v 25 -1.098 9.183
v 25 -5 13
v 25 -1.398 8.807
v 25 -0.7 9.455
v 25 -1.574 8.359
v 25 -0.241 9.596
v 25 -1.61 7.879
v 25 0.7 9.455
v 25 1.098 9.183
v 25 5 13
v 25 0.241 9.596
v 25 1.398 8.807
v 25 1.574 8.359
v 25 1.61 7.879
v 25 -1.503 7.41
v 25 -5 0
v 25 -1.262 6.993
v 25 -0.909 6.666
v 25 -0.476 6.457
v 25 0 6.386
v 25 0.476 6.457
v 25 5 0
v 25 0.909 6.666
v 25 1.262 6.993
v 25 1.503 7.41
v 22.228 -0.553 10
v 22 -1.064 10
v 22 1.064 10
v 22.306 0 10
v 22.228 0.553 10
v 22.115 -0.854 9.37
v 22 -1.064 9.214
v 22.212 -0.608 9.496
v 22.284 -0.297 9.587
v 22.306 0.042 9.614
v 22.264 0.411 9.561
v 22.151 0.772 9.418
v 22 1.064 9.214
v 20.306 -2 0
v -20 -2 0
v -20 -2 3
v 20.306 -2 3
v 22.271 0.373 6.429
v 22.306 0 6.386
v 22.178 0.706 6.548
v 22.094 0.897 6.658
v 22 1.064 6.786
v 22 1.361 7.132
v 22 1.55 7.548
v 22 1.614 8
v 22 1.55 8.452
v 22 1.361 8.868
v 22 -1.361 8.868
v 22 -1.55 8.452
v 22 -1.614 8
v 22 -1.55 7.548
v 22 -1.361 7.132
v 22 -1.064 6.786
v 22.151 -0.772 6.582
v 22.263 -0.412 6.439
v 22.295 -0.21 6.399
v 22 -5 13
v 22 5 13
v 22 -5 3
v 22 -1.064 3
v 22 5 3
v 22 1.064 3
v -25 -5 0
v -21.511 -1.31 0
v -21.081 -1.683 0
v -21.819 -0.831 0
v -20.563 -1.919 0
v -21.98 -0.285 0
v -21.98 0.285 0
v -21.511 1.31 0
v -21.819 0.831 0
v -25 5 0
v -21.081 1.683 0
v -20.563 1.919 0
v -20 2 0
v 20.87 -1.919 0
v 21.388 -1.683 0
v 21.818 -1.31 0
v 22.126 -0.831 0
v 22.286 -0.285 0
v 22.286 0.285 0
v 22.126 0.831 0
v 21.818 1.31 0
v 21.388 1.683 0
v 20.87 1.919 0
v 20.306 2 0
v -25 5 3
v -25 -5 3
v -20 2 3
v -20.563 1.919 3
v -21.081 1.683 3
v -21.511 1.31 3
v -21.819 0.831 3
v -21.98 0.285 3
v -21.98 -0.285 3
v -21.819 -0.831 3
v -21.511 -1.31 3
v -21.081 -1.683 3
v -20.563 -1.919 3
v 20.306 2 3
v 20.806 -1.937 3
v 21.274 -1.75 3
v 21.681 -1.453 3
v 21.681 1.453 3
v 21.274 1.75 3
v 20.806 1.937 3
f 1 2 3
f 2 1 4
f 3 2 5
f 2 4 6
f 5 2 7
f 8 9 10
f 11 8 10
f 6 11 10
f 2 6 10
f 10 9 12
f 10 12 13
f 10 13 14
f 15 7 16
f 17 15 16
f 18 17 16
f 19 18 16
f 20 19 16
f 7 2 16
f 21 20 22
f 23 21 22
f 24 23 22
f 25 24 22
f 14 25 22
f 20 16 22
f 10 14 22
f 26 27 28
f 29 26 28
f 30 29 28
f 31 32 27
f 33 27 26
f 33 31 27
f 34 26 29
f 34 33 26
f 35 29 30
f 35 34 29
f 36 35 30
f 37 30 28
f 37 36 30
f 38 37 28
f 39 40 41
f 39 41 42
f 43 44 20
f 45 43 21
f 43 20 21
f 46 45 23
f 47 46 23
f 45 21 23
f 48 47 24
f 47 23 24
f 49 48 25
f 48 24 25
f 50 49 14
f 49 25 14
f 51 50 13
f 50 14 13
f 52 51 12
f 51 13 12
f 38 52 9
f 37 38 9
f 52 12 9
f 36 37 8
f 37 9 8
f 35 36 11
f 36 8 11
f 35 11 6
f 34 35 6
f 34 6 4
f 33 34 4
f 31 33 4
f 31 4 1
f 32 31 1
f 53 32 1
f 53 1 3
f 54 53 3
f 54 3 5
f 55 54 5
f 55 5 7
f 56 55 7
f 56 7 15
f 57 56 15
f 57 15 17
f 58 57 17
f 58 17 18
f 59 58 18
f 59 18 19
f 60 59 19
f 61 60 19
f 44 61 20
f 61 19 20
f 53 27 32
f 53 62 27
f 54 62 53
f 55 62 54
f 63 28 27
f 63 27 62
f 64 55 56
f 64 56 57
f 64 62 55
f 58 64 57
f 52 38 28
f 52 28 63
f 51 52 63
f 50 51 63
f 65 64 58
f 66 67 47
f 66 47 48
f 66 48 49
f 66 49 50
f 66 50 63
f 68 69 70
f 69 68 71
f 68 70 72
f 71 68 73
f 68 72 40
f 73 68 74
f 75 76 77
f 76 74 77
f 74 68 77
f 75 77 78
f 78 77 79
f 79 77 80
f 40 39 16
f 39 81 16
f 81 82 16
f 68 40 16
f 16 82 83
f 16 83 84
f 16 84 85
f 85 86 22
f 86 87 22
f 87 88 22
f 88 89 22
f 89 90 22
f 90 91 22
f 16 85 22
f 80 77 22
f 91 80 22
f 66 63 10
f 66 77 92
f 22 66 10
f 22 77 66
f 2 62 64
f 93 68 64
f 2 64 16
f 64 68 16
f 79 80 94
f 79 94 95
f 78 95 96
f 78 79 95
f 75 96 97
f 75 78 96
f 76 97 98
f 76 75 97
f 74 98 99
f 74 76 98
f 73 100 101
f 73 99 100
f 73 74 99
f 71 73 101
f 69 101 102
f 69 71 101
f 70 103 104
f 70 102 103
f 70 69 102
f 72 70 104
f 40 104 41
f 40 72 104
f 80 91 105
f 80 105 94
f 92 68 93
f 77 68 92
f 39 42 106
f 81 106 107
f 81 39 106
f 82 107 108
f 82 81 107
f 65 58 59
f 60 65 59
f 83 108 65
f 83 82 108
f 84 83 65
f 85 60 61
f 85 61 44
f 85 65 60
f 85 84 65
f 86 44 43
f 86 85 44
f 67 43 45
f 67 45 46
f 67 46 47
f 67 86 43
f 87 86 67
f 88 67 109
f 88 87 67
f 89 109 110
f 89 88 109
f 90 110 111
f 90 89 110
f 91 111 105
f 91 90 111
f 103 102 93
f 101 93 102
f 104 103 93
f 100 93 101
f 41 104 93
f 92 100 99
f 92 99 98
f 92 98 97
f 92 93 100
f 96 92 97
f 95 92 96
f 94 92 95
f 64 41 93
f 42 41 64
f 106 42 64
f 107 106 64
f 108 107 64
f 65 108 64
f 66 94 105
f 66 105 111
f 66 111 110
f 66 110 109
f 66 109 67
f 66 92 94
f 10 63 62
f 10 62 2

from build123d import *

# Parameters (mm, degrees)
SKETCH1_W           = 50
SKETCH1_H           = 10
BOSS_EXTRUDE1_DEPTH = 3
SKETCH2_W           = 3
SKETCH2_H           = 10
BOSS_EXTRUDE2_DEPTH = 10
SKETCH3_R           = 1.614445202
CUT_EXTRUDE1_DEPTH  = 10
CUT_EXTRUDE2_DEPTH  = 10


with BuildPart() as part:
    # Sketch1 → Boss-Extrude1 (new body)
    with BuildSketch(Plane.XY):
        Rectangle(SKETCH1_W, SKETCH1_H)
    extrude(amount=BOSS_EXTRUDE1_DEPTH)

    # Sketch2 → Boss-Extrude2 (add)
    with BuildSketch(Plane.XY.offset(3)):
        with Locations((23.5, 0)):
            Rectangle(SKETCH2_W, SKETCH2_H)
    extrude(amount=BOSS_EXTRUDE2_DEPTH)

    # Sketch3 → Cut-Extrude1 (cut)
    with BuildSketch(Plane(origin=(25, 0, 0), x_dir=(0, 0, -1), z_dir=(1, 0, 0))):
        with Locations((-8, 0)):
            Circle(SKETCH3_R)
    extrude(amount=-CUT_EXTRUDE1_DEPTH, mode=Mode.SUBTRACT)

    # Sketch5 → Cut-Extrude2 (cut)
    with BuildSketch(Plane(origin=(0, 0, 0), x_dir=(-1, 0, 0), z_dir=(0, 0, -1))):
        with BuildLine():
            Line((20, -2), (-20.306358663, -2))
            ThreePointArc((-20.306358663, -2), (-22.306358663, 0), (-20.306358663, 2))
            Line((-20.306358663, 2), (20, 2))
            ThreePointArc((20, 2), (22, 0), (20, -2))
        make_face()
    extrude(amount=-CUT_EXTRUDE2_DEPTH, mode=Mode.SUBTRACT)


solid = part.part
